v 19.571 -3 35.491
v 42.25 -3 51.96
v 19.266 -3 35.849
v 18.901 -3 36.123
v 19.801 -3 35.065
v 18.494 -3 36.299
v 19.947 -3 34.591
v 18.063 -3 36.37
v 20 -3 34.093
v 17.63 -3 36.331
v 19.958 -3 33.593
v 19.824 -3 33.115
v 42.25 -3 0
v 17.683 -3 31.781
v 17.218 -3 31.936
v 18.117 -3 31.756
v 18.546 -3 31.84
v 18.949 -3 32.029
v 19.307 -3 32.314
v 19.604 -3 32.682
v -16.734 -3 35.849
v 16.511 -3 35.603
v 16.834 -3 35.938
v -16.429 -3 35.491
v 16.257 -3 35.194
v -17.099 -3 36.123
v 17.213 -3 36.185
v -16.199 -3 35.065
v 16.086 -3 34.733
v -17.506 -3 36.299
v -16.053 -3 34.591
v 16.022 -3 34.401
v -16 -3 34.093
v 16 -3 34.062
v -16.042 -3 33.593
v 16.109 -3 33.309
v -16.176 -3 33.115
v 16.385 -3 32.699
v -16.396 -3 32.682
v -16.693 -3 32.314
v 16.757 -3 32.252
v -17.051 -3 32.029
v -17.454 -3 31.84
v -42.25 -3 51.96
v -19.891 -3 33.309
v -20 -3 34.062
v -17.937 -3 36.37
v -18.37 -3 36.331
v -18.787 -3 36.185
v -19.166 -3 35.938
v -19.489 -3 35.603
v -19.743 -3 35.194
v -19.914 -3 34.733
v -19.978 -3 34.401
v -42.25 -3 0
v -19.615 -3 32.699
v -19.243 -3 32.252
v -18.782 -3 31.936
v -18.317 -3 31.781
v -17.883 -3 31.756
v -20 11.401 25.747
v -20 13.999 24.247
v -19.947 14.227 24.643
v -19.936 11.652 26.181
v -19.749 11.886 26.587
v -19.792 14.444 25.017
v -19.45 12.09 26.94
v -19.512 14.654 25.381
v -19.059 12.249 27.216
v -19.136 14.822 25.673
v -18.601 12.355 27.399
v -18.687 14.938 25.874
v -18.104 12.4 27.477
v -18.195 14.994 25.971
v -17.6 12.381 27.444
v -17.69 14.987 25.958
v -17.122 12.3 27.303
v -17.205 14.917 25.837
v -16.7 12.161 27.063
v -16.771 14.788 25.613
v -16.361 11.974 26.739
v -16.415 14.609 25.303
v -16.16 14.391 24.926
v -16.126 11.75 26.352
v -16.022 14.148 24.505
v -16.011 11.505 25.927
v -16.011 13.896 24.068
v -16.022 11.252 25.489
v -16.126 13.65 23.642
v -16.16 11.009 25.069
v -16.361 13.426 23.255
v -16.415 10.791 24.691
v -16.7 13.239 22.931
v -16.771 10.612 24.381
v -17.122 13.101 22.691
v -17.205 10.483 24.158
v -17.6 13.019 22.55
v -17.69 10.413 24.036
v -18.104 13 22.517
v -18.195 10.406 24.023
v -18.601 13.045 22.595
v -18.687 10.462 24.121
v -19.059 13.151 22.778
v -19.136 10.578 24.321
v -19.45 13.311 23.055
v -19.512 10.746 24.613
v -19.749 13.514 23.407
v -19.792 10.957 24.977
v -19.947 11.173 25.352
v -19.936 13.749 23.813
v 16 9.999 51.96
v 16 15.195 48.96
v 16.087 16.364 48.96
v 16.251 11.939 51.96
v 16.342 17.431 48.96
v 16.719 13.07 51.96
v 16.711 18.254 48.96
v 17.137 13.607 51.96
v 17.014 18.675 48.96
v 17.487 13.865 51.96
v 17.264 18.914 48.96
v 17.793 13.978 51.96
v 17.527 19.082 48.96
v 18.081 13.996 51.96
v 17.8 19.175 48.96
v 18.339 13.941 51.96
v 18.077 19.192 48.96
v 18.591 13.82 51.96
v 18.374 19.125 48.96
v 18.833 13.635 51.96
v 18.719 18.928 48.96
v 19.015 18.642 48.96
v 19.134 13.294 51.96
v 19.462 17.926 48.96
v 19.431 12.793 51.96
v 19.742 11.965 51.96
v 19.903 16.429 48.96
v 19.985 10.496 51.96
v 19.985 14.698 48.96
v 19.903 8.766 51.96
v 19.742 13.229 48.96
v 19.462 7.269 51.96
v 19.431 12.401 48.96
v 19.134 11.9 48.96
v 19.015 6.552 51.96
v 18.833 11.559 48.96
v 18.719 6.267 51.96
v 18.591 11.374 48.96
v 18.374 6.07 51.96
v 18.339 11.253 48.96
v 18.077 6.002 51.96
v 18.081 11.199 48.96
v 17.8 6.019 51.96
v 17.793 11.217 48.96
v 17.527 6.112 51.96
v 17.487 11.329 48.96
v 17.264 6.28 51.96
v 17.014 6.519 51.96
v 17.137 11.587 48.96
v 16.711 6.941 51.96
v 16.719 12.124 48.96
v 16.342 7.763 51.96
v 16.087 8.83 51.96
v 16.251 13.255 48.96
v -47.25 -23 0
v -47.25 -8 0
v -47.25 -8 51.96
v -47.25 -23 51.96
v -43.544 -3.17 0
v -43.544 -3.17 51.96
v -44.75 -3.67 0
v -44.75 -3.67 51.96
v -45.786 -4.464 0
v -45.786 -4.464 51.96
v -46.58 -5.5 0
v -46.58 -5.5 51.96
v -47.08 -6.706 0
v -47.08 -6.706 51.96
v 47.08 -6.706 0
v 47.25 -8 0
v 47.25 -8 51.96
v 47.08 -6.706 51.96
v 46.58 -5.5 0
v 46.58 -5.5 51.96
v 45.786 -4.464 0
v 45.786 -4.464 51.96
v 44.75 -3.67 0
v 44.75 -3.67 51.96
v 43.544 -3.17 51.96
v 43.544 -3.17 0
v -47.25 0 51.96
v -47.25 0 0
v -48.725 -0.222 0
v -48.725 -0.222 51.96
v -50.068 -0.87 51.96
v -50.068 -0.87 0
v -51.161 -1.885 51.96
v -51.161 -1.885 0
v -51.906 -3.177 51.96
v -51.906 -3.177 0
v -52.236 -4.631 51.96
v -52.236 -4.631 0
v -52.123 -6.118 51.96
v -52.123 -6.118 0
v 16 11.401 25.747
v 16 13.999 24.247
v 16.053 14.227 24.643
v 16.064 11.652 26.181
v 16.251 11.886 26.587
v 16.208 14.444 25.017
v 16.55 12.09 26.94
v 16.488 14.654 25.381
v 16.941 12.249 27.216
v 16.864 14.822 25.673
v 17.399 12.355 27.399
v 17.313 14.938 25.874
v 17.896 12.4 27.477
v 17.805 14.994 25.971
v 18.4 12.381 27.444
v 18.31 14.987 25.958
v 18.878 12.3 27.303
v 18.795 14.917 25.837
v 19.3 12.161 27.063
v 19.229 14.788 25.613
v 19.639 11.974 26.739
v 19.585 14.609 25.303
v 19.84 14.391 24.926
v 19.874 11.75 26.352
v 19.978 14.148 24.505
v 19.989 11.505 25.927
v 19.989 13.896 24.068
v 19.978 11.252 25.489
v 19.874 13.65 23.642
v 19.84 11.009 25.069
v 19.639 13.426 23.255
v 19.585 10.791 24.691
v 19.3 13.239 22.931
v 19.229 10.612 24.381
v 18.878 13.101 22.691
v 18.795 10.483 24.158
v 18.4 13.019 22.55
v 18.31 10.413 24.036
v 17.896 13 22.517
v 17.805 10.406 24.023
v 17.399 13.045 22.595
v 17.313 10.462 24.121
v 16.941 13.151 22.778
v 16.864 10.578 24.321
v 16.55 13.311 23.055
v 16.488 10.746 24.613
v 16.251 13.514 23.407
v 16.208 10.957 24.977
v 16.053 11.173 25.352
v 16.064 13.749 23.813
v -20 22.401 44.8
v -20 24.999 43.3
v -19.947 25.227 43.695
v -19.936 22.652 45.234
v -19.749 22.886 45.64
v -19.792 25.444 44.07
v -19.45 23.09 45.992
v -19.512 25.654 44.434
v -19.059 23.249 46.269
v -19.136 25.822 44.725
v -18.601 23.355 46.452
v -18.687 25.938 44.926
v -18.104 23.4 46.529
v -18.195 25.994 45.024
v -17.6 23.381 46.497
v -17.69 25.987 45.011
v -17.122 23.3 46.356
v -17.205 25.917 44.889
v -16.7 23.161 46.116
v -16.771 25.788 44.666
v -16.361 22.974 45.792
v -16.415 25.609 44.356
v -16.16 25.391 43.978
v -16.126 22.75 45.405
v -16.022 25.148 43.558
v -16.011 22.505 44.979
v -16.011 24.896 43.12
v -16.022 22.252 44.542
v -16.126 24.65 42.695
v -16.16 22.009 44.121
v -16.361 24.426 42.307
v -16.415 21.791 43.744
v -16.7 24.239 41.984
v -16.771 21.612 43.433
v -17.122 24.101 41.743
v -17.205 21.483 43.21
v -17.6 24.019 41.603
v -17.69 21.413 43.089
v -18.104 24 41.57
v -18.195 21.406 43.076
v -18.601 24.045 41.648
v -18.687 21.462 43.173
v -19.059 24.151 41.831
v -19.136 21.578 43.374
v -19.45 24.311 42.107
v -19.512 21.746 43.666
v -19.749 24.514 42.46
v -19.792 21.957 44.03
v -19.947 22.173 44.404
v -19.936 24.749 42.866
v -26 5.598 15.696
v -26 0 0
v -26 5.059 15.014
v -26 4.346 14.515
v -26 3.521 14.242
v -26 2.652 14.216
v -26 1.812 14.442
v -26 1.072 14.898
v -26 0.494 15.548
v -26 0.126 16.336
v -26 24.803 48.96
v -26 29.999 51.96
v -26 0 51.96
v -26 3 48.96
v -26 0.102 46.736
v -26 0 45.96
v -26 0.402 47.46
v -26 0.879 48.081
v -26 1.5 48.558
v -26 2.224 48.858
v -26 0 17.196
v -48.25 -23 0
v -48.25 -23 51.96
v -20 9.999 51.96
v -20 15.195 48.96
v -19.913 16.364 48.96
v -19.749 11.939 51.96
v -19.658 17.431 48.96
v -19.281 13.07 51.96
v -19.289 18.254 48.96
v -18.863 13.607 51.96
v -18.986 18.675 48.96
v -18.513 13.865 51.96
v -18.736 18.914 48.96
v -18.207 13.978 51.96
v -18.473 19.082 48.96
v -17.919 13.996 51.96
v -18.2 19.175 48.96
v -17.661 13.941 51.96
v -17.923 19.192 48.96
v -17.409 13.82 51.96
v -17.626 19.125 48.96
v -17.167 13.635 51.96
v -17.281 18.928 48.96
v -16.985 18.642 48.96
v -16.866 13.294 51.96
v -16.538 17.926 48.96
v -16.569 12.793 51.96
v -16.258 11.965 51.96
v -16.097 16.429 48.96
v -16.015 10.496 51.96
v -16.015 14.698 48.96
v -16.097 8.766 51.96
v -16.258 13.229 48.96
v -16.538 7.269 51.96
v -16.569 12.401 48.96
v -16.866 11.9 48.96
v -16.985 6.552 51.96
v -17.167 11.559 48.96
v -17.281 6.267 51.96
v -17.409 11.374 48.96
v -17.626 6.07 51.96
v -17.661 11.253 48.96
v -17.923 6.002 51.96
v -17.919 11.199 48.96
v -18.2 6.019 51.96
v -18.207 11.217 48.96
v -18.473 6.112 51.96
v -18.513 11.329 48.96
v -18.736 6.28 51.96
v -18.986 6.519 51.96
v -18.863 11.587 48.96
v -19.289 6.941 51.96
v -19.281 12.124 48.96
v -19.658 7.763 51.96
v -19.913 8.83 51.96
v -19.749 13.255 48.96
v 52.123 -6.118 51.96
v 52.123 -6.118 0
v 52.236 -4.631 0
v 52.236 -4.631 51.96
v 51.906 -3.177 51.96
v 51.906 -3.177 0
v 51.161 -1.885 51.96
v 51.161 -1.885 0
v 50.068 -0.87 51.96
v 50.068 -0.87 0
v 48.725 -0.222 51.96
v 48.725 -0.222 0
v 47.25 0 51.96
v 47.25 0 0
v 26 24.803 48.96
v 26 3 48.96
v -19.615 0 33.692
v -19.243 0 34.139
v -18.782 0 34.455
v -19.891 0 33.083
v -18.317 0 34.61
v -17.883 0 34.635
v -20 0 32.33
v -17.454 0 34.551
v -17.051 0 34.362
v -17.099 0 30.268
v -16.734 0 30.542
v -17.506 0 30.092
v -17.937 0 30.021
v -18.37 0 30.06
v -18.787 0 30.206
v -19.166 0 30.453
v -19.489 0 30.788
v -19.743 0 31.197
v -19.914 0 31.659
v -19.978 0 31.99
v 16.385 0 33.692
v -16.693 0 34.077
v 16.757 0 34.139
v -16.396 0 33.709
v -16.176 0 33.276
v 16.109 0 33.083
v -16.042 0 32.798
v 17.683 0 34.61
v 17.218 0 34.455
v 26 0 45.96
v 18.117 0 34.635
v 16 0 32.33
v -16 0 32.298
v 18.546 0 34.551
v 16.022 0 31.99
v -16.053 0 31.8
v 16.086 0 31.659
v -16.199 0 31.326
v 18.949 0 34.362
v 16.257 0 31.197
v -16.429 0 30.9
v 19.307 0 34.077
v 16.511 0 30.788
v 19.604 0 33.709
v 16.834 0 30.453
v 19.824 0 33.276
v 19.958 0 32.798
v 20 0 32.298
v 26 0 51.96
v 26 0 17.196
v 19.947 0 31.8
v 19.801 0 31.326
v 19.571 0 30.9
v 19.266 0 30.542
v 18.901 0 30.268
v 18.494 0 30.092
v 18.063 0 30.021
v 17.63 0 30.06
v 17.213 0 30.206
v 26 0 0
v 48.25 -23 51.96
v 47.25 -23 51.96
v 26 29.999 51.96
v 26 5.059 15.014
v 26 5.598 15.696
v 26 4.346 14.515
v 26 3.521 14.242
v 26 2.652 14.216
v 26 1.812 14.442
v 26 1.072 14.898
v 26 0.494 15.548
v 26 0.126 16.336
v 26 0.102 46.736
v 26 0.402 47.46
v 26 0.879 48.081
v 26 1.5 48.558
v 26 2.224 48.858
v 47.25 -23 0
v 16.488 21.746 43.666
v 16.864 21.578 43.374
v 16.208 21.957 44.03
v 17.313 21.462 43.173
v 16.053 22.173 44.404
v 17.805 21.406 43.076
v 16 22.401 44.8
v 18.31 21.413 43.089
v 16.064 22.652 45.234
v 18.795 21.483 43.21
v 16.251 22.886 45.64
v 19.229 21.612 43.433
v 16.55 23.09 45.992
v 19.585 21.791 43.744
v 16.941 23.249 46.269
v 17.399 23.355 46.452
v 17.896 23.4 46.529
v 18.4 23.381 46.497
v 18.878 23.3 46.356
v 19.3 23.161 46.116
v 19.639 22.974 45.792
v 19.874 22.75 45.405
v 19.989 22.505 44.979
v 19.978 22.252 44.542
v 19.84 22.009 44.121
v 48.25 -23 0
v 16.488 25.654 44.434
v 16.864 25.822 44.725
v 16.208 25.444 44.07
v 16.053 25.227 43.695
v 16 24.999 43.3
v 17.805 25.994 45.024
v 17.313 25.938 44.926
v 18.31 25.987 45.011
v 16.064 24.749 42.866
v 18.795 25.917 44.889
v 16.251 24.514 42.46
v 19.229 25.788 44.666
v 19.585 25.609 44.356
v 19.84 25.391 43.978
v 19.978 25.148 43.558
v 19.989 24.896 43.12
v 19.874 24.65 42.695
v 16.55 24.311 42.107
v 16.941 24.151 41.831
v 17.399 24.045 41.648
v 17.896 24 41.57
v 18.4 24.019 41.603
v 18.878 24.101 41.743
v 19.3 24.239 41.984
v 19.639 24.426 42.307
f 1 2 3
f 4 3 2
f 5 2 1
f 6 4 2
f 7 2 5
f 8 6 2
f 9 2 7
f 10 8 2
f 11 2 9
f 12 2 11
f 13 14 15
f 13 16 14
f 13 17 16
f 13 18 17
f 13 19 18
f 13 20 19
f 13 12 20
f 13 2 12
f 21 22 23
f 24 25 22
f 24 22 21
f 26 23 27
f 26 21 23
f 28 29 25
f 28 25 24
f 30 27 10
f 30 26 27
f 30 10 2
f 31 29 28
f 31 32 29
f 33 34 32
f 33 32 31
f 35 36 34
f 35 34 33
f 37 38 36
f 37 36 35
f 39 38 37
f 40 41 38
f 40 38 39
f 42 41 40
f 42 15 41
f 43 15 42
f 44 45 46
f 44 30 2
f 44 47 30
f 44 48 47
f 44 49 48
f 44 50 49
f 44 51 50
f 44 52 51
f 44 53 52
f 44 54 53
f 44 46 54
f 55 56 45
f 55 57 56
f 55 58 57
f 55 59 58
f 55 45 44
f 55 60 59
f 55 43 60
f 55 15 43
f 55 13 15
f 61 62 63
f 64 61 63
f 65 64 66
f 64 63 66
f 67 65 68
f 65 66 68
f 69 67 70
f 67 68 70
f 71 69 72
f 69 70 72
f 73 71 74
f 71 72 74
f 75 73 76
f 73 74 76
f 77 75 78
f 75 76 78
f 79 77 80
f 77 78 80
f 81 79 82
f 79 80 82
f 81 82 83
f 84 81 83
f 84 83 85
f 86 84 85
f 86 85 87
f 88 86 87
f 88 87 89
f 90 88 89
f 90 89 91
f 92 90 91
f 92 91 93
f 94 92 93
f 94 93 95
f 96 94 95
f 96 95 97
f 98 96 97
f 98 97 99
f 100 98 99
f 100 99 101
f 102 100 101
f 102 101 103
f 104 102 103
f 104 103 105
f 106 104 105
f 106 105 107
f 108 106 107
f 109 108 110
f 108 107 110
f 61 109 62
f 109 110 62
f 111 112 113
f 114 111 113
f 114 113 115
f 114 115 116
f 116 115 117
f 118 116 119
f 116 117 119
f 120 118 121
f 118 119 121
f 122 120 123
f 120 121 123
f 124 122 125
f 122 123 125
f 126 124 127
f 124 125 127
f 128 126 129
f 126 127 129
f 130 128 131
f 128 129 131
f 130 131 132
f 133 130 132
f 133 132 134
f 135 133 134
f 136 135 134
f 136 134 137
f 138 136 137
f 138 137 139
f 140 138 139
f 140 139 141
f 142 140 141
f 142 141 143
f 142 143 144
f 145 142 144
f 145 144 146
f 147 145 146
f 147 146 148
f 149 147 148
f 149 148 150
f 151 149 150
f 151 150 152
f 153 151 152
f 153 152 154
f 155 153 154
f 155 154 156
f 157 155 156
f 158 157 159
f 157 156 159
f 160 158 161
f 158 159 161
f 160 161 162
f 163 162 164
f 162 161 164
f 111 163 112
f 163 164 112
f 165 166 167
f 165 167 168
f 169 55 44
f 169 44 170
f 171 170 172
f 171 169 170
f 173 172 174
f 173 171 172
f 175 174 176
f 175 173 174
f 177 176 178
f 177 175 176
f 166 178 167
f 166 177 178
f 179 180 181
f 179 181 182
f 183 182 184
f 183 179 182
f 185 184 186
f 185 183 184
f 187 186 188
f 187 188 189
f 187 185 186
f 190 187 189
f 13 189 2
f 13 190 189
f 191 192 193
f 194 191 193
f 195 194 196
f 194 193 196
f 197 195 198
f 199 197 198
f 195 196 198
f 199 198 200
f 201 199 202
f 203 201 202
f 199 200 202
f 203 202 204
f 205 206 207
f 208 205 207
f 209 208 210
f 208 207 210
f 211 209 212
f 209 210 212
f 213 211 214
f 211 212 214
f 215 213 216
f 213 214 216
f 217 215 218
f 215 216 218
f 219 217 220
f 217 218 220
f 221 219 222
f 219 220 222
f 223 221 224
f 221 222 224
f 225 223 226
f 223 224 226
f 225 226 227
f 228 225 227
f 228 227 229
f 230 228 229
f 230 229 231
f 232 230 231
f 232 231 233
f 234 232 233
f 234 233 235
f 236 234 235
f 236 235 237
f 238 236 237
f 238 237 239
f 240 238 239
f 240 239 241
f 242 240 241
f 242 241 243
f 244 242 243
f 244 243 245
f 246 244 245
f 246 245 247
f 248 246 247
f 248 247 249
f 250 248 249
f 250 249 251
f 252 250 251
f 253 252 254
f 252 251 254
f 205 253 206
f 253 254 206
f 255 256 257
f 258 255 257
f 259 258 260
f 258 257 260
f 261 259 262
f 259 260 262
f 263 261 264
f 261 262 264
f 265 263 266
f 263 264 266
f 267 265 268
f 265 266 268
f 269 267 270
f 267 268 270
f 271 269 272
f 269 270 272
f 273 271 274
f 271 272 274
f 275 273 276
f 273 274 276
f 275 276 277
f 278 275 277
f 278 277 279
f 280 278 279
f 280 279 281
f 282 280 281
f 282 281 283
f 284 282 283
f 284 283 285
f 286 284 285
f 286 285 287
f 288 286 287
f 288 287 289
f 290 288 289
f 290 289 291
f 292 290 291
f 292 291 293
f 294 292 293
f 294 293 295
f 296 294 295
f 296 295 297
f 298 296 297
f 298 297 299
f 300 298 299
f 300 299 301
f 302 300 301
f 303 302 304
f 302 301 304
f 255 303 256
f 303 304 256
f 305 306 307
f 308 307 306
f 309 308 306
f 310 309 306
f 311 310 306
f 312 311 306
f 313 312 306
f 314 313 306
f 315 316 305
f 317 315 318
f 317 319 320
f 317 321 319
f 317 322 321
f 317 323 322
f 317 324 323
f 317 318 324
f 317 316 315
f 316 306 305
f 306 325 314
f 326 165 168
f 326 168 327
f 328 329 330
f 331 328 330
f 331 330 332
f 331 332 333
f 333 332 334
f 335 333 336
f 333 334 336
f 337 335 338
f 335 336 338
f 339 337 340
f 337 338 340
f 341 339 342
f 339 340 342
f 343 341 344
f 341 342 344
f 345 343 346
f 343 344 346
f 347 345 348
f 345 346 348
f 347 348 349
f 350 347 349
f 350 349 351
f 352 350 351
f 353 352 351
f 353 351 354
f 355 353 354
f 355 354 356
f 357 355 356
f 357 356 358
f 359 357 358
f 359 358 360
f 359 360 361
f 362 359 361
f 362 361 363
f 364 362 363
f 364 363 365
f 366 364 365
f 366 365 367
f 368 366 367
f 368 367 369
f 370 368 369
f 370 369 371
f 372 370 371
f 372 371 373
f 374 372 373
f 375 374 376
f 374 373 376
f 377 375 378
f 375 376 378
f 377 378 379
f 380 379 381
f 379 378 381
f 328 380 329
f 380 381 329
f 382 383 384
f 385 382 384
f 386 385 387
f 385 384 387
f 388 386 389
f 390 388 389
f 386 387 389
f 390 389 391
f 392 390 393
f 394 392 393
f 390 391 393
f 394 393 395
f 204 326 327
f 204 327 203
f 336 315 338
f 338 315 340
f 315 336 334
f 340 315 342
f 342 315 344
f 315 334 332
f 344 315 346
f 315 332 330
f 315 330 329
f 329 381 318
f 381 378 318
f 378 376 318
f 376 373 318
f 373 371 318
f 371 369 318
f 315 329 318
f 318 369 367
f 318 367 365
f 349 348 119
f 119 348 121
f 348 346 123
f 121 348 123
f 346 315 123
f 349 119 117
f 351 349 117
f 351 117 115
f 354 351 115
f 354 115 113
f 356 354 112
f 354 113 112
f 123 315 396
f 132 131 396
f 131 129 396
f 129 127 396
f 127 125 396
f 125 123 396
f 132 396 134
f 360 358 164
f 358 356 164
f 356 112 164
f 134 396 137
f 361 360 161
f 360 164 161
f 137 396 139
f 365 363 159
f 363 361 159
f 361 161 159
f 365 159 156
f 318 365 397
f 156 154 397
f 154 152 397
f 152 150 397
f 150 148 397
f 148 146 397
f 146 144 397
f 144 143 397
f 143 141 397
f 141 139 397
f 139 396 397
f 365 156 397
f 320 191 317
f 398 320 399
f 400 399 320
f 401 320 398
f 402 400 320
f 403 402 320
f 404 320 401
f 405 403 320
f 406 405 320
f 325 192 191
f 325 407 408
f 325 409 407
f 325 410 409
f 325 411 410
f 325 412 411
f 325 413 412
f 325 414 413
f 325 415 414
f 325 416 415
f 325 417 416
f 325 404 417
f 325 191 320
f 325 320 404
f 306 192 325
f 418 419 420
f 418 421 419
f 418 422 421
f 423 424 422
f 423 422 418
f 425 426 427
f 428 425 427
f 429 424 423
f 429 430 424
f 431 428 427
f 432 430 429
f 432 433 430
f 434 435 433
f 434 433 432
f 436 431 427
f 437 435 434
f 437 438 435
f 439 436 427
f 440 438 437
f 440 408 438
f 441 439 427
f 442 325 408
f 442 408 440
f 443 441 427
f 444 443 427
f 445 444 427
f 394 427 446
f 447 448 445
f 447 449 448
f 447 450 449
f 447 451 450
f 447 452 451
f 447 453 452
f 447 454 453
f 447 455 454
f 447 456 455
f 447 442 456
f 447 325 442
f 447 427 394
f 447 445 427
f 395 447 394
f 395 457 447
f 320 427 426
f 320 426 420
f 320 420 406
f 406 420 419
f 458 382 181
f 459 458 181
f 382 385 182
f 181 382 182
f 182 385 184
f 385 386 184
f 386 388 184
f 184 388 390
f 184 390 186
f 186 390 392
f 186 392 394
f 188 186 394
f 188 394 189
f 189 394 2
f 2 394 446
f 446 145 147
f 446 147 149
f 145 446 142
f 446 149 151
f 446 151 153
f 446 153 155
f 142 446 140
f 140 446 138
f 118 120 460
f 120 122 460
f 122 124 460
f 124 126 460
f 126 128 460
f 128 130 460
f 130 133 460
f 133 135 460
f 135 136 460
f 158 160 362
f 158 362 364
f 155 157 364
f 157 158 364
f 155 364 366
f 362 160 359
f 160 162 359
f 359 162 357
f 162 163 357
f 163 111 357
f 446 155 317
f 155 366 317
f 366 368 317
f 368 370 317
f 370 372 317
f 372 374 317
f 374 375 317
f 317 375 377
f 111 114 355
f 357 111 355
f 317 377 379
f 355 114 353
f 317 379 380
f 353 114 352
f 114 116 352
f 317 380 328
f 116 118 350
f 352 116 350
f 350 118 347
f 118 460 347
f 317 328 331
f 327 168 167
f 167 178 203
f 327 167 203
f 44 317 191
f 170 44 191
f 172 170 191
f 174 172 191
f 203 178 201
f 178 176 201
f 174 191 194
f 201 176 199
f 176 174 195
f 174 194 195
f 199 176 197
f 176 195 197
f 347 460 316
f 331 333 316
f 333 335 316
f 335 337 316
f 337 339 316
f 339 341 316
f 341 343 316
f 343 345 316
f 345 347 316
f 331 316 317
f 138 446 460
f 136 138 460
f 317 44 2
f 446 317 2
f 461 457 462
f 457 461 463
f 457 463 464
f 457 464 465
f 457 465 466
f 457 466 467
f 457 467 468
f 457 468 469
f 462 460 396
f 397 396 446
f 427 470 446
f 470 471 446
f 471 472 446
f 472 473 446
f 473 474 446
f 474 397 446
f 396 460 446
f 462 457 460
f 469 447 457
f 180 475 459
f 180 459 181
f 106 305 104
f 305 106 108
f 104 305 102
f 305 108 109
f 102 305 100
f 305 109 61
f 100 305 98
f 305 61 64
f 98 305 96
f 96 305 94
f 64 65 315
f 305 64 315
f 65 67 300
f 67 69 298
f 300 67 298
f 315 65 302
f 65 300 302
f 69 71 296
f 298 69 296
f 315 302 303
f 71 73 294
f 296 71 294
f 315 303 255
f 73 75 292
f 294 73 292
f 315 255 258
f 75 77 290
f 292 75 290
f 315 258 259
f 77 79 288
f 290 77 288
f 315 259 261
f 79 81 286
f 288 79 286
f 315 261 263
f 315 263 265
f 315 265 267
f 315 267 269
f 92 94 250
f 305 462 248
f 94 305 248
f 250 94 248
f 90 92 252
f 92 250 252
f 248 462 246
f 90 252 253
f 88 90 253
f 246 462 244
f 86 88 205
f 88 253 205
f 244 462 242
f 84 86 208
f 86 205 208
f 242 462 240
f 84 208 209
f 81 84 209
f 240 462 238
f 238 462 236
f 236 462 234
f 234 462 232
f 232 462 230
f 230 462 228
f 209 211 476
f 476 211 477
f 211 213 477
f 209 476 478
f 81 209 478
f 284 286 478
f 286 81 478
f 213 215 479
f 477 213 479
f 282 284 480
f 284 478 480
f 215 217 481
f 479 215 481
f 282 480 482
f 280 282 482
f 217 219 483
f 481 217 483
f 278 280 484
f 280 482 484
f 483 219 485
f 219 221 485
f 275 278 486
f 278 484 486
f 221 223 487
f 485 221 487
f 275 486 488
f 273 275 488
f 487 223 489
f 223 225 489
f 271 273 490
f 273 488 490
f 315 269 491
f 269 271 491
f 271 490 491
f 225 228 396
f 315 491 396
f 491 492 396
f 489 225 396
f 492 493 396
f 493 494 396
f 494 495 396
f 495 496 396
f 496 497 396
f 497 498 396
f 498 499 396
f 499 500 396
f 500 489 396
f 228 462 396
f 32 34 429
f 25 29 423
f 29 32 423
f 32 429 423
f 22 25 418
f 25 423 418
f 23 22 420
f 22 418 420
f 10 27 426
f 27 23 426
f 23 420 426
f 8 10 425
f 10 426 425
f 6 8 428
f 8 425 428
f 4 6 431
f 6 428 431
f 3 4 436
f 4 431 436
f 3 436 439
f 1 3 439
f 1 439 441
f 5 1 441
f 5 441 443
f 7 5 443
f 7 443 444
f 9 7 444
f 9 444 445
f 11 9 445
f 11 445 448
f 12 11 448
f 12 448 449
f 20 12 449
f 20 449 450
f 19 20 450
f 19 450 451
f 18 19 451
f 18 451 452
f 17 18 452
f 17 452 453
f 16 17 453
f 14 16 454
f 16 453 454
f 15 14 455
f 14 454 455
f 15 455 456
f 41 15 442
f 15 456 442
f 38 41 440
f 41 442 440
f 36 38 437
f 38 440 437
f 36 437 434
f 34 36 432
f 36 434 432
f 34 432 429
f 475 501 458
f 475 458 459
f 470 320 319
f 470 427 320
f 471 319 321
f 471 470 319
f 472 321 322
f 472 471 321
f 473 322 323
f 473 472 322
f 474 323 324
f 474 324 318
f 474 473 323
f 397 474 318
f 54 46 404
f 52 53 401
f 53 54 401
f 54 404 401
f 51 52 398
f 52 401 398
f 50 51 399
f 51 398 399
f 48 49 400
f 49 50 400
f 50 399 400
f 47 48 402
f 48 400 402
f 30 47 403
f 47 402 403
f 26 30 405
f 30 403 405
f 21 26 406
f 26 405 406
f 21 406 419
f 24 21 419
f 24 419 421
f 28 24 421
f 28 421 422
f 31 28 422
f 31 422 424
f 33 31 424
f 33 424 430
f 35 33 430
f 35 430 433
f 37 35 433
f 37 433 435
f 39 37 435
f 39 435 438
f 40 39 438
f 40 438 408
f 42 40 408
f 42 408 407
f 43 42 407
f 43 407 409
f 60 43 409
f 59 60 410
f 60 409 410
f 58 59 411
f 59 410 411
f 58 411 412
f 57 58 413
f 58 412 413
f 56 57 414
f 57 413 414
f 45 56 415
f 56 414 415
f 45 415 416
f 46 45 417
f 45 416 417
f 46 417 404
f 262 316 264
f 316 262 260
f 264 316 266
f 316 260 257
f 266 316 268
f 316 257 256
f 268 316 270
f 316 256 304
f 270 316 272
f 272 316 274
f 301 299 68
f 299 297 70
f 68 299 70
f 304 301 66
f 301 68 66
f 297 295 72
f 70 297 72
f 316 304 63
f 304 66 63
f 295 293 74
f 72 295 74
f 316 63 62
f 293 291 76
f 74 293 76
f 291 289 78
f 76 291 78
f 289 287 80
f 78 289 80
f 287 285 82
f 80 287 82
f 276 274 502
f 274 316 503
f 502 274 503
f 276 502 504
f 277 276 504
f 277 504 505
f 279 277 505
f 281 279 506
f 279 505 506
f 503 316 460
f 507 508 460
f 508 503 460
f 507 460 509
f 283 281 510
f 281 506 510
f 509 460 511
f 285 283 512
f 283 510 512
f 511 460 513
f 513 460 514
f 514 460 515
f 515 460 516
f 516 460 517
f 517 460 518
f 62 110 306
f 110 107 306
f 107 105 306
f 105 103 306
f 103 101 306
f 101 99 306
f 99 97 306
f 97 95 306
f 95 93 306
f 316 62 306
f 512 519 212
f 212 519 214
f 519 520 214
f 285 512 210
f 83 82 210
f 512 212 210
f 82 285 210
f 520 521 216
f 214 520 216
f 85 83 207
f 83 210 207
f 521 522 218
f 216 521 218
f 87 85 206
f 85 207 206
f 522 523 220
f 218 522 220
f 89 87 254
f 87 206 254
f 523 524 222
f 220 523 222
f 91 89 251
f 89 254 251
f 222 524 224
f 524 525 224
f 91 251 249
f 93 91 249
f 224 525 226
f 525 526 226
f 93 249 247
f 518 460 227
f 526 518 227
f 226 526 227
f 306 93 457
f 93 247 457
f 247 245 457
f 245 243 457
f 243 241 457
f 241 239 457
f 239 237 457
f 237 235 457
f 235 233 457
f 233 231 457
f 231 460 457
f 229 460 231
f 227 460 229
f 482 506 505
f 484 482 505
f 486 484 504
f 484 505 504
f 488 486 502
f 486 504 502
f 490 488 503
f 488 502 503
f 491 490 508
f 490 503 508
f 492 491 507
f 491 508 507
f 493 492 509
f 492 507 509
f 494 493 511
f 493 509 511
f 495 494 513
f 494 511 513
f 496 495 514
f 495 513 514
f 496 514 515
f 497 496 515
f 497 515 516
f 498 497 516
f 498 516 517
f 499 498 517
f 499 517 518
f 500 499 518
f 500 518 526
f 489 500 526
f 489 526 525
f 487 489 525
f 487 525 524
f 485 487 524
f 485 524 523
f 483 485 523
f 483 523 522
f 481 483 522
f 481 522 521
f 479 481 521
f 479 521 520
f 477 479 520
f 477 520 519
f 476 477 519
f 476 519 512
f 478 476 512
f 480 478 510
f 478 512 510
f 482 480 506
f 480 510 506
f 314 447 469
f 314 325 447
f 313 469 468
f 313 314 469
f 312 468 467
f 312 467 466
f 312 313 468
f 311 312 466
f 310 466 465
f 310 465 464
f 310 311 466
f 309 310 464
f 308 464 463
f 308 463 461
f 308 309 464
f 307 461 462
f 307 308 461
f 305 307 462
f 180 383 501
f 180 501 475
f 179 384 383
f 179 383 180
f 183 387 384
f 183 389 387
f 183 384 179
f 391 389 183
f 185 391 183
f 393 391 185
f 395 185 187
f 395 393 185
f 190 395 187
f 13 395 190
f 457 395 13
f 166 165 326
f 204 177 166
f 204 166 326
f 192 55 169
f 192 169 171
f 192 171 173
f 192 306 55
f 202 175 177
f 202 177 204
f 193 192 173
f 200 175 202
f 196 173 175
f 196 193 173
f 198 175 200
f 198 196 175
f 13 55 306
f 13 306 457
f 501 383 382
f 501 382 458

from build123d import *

# Parameters (mm, degrees)
PAD_DEPTH    = 51.96
PAD001_DEPTH = 26
SKETCH002_R  = 2
POCKET_DEPTH = 45.899584
FILLET_R     = 3


with BuildPart() as part:
    # Sketch → Pad (new body)
    with BuildSketch(Plane.XY):
        with BuildLine():
            Line((-48.25, -23), (-52.123371, -6.118146))
            ThreePointArc((-47.25, 0), (-51.160929, -1.884774), (-52.123371, -6.118146))
            Line((-47.25, 0), (47.25, 0))
            ThreePointArc((52.123371, -6.118146), (51.160929, -1.884774), (47.25, 0))
            Line((52.123371, -6.118146), (48.25, -23))
            Line((48.25, -23), (47.25, -23))
            Line((47.25, -23), (47.25, -8))
            ThreePointArc((47.25, -8), (45.785534, -4.464466), (42.25, -3))
            Line((42.25, -3), (-42.25, -3))
            ThreePointArc((-42.25, -3), (-45.785534, -4.464466), (-47.25, -8))
            Line((-47.25, -8), (-47.25, -23))
            Line((-47.25, -23), (-48.25, -23))
        make_face()
    extrude(amount=PAD_DEPTH)

    # Sketch001 → Pad001 (join, symmetric)
    with BuildSketch(Plane.YZ):
        Polygon((0, 51.96), (29.99912, 51.96), (0, 0), (0, 6), (24.802968, 48.96), (0, 48.96), align=None)
    extrude(amount=PAD001_DEPTH, both=True)

    # Sketch002 (on Face15 of Pad001) → Pocket (cut, through all)
    with BuildSketch(Plane(origin=(0, 0, 0), x_dir=(-1, 0, 0), z_dir=(0, 0.866025, -0.5))):
        with Locations((-18, 49.99824)):
            Circle(SKETCH002_R)
        with Locations((18, 49.99824)):
            Circle(SKETCH002_R)
        with Locations((-18, 27.99824)):
            Circle(SKETCH002_R)
        with Locations((18, 27.99824)):
            Circle(SKETCH002_R)
    extrude(amount=-POCKET_DEPTH, mode=Mode.SUBTRACT)

    # Fillet
    fillet_edges = [part.edges().sort_by_distance(p)[0] for p in [
        (0, 0, 48.96),
        (0, 0, 6),
    ]]
    fillet(fillet_edges, radius=FILLET_R)


solid = part.part
